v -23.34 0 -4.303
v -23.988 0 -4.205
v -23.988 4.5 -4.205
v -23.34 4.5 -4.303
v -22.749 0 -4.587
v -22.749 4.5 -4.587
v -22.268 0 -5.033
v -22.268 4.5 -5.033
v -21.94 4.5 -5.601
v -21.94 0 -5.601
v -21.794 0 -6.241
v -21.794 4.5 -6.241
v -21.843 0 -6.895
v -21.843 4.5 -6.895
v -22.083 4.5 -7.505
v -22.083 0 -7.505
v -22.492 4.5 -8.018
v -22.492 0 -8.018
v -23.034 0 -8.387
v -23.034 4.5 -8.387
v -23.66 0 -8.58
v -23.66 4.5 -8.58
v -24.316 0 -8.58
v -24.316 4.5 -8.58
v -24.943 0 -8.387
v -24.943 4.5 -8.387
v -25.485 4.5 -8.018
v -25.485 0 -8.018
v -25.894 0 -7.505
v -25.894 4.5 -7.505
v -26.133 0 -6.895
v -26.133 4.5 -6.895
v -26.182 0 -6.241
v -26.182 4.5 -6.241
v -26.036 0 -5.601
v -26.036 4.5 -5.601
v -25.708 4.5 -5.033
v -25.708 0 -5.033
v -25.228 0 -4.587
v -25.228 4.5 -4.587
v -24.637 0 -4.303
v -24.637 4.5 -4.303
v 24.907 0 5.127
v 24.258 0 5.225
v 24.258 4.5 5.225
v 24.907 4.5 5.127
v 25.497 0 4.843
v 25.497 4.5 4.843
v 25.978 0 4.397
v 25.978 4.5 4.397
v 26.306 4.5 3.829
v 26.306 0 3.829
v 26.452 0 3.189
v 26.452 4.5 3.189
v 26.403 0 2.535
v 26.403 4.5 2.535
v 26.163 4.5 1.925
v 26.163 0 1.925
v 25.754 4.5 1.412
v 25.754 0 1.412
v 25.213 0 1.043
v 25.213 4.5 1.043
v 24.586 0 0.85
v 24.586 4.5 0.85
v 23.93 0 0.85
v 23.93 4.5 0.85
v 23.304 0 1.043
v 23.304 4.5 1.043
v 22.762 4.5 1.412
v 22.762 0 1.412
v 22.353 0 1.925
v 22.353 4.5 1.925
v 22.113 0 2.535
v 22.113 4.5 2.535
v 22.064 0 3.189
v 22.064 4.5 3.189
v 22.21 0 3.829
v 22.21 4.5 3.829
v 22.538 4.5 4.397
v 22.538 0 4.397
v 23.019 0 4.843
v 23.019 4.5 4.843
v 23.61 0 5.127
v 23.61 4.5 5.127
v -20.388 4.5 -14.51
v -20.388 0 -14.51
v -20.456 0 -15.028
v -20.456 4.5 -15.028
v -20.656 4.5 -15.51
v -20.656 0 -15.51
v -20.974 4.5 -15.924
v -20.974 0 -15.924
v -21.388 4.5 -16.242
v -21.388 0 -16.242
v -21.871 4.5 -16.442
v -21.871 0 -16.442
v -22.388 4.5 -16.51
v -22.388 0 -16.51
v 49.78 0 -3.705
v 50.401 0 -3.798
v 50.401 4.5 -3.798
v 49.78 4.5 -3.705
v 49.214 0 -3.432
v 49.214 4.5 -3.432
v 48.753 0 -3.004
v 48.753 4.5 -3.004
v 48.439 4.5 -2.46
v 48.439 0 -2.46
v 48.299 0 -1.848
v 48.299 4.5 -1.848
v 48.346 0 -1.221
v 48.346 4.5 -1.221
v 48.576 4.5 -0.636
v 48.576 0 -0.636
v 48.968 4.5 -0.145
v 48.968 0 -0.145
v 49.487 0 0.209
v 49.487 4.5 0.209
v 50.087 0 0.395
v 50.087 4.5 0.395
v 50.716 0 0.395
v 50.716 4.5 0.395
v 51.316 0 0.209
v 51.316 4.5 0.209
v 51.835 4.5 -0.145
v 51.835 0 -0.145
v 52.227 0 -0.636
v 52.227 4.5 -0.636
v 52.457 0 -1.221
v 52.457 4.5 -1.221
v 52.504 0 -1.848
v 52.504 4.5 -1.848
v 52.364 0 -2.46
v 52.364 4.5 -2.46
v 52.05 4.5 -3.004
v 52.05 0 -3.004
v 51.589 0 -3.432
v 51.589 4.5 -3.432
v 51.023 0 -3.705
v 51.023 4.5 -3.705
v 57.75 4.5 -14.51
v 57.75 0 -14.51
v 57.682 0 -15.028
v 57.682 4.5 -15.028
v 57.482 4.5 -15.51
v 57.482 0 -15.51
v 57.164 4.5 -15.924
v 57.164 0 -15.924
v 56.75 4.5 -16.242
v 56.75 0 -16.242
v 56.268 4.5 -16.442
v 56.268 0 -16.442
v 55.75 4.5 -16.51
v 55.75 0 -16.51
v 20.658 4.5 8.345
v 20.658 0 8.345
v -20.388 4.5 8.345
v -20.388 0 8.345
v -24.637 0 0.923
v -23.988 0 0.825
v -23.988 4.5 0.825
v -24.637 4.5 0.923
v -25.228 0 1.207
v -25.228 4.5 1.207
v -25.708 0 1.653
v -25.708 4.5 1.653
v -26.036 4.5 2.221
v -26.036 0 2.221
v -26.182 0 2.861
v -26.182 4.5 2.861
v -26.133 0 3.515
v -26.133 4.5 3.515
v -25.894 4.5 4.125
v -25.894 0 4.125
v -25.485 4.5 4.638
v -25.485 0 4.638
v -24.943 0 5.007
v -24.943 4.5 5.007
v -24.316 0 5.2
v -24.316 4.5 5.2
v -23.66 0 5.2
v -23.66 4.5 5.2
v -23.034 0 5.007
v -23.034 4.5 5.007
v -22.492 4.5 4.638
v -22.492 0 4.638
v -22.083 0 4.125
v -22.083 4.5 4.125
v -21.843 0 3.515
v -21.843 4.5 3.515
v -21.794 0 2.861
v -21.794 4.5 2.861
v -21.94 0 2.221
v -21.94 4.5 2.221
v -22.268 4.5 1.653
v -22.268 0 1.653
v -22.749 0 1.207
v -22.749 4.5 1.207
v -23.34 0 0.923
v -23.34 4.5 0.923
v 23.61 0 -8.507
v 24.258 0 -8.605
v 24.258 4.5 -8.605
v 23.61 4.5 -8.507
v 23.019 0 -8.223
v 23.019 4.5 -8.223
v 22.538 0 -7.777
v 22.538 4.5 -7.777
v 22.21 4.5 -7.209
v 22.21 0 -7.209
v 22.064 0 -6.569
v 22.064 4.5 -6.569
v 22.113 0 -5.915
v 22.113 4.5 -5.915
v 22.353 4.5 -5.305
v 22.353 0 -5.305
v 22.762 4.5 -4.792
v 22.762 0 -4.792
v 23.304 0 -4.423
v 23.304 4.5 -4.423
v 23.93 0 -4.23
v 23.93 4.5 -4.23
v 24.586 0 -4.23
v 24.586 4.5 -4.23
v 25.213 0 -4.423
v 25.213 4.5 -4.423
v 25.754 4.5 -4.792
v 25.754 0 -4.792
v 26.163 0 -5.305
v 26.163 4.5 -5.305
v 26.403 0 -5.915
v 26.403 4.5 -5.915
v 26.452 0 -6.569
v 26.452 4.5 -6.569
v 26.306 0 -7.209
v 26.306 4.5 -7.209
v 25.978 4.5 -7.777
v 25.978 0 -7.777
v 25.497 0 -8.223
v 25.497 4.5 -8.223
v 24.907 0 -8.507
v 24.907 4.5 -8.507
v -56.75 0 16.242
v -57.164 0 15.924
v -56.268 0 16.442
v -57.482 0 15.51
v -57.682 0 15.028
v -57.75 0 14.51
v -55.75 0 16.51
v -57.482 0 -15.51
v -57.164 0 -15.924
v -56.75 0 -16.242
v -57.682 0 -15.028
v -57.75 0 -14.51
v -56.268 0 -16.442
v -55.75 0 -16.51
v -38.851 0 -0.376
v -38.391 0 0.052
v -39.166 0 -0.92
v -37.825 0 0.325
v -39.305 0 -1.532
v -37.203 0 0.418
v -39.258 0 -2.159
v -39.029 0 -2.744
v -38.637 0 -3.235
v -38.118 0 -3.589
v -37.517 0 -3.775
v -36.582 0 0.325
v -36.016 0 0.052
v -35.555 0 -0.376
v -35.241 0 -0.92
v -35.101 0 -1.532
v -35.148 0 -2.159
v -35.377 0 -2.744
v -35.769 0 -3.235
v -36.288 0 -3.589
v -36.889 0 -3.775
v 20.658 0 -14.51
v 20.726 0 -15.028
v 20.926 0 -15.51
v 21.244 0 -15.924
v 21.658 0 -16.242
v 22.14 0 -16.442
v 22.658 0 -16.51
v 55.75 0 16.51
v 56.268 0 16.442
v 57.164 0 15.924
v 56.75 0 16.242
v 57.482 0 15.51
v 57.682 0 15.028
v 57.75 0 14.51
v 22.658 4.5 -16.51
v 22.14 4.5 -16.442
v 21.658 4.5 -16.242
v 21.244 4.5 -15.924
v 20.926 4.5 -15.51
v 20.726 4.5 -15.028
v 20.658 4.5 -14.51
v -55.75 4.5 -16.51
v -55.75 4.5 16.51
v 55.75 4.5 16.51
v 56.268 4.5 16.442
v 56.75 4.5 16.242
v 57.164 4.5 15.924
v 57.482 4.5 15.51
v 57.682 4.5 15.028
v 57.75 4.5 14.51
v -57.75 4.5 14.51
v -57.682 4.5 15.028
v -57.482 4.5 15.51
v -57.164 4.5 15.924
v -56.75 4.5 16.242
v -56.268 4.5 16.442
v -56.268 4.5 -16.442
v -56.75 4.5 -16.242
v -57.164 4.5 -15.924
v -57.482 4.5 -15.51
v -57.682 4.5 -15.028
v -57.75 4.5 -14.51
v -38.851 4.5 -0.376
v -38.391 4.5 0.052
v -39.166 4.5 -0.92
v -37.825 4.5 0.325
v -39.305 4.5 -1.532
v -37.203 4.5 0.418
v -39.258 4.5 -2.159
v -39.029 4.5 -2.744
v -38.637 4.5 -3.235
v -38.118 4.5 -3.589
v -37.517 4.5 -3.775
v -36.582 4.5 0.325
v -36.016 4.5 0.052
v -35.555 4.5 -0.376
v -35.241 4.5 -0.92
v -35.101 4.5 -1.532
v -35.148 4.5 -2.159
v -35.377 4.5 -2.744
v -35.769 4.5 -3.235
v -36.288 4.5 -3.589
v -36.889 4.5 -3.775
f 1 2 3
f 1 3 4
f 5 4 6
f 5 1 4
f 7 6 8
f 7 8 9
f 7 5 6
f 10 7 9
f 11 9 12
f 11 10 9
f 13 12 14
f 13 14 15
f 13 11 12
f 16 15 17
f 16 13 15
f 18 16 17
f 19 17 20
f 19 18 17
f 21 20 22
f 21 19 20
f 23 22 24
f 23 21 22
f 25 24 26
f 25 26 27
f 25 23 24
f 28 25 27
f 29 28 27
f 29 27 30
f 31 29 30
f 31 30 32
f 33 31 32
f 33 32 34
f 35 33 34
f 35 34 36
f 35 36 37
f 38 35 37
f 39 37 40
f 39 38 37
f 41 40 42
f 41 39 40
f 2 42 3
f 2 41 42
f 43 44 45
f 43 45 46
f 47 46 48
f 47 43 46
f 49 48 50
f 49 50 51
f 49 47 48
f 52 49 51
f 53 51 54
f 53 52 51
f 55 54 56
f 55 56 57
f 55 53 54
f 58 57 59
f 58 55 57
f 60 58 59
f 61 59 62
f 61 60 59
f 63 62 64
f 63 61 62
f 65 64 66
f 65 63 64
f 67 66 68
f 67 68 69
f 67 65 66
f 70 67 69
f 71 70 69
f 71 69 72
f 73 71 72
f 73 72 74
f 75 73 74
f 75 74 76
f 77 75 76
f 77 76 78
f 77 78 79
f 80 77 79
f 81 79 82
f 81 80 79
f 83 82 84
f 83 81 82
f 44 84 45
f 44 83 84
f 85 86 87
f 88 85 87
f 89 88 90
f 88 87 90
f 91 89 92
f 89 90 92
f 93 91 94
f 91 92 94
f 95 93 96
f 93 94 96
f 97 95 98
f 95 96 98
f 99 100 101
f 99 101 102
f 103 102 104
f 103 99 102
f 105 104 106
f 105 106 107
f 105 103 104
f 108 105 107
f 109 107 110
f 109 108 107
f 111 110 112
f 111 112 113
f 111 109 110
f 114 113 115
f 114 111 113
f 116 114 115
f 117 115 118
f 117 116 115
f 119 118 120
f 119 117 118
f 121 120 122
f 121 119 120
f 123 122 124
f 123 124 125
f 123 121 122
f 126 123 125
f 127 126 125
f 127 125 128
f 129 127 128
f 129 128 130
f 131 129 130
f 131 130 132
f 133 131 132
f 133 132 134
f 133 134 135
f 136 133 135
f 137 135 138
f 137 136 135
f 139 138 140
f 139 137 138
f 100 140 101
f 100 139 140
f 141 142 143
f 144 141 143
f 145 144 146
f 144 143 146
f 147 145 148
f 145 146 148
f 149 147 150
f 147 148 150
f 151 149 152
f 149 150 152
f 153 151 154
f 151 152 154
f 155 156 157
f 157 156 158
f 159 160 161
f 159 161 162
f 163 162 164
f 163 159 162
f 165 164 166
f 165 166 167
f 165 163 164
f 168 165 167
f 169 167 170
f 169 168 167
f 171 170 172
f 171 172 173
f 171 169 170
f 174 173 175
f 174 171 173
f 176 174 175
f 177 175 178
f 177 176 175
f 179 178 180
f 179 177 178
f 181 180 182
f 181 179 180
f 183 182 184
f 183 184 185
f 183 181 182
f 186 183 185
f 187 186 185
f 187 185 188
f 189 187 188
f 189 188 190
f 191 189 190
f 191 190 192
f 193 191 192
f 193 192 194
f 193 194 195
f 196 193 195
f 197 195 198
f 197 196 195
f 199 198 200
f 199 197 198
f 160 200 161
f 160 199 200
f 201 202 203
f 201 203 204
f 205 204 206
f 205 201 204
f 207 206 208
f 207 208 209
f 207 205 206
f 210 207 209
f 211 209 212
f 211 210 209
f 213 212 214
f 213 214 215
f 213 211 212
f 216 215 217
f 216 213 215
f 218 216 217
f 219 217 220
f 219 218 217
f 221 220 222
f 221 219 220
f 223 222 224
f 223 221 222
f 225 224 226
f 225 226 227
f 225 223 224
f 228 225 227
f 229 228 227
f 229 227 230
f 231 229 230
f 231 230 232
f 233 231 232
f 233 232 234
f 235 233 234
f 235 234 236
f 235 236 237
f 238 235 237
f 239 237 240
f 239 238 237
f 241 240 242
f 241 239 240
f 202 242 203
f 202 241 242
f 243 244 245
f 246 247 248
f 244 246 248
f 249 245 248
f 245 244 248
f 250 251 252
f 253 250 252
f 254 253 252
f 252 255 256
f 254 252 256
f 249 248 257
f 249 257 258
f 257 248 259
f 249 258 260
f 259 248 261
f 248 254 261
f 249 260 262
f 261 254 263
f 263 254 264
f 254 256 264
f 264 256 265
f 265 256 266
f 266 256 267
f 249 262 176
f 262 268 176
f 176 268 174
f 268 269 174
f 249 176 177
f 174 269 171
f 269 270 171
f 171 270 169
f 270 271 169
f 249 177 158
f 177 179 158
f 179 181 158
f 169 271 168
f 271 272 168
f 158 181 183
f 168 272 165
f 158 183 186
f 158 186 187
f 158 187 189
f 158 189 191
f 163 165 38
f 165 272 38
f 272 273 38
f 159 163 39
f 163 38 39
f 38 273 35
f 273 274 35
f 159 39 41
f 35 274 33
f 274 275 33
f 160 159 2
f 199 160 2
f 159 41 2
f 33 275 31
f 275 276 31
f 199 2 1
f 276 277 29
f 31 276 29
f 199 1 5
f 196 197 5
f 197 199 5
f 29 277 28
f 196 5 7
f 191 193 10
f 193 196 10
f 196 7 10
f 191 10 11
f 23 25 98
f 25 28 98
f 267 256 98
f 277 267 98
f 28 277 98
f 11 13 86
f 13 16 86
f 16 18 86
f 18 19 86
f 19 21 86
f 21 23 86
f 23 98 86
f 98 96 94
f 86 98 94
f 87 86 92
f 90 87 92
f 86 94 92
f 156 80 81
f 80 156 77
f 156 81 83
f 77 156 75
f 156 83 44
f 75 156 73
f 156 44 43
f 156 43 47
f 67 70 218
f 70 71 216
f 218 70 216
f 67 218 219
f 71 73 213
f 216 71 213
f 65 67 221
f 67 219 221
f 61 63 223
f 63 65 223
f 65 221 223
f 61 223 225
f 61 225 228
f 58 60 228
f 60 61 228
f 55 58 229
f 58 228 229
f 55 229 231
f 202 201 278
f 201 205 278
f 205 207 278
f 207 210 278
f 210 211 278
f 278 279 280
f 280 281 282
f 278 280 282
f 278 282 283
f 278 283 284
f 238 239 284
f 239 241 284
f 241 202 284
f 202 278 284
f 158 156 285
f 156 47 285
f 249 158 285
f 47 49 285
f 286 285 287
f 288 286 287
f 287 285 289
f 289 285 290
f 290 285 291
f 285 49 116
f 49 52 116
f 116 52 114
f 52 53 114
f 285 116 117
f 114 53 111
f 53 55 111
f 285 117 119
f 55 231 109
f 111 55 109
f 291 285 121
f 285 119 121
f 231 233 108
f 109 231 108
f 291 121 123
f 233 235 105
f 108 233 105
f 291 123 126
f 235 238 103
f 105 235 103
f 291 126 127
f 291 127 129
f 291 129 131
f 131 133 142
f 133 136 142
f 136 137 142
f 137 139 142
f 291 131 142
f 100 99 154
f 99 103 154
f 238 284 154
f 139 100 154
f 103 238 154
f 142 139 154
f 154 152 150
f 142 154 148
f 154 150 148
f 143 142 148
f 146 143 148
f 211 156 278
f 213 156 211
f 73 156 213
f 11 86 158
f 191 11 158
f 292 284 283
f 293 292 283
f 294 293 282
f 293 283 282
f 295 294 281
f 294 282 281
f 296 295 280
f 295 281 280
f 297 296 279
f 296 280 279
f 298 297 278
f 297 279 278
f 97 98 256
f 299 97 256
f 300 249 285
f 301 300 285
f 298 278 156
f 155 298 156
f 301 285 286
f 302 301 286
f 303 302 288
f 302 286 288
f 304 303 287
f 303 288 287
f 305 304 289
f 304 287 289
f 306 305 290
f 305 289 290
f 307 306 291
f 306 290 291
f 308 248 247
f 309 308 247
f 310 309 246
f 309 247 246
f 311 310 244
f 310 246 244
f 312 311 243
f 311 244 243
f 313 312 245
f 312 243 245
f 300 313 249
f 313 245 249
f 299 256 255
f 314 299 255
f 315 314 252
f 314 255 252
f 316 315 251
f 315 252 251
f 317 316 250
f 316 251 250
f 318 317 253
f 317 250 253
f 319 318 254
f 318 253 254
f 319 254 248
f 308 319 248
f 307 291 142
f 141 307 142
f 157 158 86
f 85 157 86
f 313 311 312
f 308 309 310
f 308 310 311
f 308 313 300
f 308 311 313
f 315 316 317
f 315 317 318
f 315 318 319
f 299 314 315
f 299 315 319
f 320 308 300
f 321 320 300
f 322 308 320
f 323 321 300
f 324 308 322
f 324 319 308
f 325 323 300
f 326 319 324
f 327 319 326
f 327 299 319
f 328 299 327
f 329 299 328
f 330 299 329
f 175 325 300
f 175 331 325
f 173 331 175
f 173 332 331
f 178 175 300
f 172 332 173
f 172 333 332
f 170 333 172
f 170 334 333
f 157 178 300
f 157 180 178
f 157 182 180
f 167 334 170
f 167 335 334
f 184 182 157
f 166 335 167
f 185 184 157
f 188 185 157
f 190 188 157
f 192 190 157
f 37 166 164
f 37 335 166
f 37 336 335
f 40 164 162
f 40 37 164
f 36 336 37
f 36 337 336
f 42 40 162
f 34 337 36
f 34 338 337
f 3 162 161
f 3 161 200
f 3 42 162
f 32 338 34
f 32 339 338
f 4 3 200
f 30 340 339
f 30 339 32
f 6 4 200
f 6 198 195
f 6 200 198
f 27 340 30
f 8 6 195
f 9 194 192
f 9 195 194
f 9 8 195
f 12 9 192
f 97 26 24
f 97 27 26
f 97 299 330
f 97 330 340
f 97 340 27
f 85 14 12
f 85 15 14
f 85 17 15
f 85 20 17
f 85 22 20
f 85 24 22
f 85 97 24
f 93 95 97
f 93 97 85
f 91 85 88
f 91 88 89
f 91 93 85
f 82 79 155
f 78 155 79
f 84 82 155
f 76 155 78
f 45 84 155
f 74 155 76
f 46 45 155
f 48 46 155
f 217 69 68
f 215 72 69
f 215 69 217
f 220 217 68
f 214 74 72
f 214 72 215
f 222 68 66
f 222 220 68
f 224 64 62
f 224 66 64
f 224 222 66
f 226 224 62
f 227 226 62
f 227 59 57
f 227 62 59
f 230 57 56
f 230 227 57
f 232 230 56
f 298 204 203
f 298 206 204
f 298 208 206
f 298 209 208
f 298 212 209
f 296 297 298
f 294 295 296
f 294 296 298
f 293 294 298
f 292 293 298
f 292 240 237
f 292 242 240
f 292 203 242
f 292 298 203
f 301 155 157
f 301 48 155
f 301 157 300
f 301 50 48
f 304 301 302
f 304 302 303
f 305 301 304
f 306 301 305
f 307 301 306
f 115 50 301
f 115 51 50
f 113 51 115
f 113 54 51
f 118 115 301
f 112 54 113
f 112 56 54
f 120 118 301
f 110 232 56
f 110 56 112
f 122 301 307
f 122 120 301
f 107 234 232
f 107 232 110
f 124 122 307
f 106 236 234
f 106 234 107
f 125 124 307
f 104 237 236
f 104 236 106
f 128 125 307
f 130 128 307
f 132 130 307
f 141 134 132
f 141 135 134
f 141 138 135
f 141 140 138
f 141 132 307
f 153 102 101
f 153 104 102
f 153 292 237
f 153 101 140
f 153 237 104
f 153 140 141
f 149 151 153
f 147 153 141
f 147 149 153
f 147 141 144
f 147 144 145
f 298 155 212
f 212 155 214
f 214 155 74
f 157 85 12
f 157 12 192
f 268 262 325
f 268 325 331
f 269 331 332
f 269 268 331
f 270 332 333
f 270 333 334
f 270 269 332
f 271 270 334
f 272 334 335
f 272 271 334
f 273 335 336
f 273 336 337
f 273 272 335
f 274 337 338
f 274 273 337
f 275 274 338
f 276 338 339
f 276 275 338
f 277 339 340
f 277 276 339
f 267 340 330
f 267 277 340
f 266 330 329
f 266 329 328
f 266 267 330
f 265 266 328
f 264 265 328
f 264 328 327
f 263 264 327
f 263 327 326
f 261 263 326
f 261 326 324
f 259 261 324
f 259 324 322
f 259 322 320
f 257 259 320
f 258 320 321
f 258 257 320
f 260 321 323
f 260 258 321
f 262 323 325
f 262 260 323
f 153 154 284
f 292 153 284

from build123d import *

# Parameters (mm, degrees)
SKETCH1_R           = 2.1082
SKETCH1_R_2         = 2.2
BOSS_EXTRUDE1_DEPTH = 4.5


with BuildPart() as part:
    # Sketch1 → Boss-Extrude1 (new body)
    with BuildSketch(Plane(origin=(0, 0, 0), x_dir=(1, 0, 0), z_dir=(0, 1, 0))):
        with BuildLine():
            Line((55.75, 16.51), (22.65807516, 16.51))
            ThreePointArc((22.65807516, 16.51), (21.243861598, 15.924213562), (20.65807516, 14.51))
            Line((20.65807516, 14.51), (20.65807516, -8.345000078))
            Line((20.65807516, -8.345000078), (-20.38832484, -8.345000078))
            Line((-20.38832484, -8.345000078), (-20.38832484, 14.51))
            ThreePointArc((-20.38832484, 14.51), (-20.974111278, 15.924213562), (-22.38832484, 16.51))
            Line((-22.38832484, 16.51), (-55.75, 16.51))
            ThreePointArc((-55.75, 16.51), (-57.164213562, 15.924213562), (-57.75, 14.51))
            Line((-57.75, 14.51), (-57.75, -14.51))
            ThreePointArc((-57.75, -14.51), (-57.164213562, -15.924213562), (-55.75, -16.51))
            Line((-55.75, -16.51), (55.75, -16.51))
            ThreePointArc((55.75, -16.51), (57.164213562, -15.924213562), (57.75, -14.51))
            Line((57.75, -14.51), (57.75, 14.51))
            ThreePointArc((57.75, 14.51), (57.164213562, 15.924213562), (55.75, 16.51))
        make_face()
        with Locations(Location((-37.20312484, 1.689999922, 0), (0, 0, 270))):
            Circle(SKETCH1_R, mode=Mode.SUBTRACT)
        with Locations(Location((50.40147516, 1.689999922, 0), (0, 0, 90))):
            Circle(SKETCH1_R, mode=Mode.SUBTRACT)
        with Locations(Location((-23.988324752, 6.404999922, 0), (0, 0, 270))):
            Circle(SKETCH1_R_2, mode=Mode.SUBTRACT)
        with Locations(Location((24.258075072, 6.404999922, 0), (0, 0, 90))):
            Circle(SKETCH1_R_2, mode=Mode.SUBTRACT)
        with Locations(Location((24.258075072, -3.025000078, 0), (0, 0, 270))):
            Circle(SKETCH1_R_2, mode=Mode.SUBTRACT)
        with Locations(Location((-23.988324752, -3.025000078, 0), (0, 0, 90))):
            Circle(SKETCH1_R_2, mode=Mode.SUBTRACT)
    extrude(amount=BOSS_EXTRUDE1_DEPTH)


solid = part.part
